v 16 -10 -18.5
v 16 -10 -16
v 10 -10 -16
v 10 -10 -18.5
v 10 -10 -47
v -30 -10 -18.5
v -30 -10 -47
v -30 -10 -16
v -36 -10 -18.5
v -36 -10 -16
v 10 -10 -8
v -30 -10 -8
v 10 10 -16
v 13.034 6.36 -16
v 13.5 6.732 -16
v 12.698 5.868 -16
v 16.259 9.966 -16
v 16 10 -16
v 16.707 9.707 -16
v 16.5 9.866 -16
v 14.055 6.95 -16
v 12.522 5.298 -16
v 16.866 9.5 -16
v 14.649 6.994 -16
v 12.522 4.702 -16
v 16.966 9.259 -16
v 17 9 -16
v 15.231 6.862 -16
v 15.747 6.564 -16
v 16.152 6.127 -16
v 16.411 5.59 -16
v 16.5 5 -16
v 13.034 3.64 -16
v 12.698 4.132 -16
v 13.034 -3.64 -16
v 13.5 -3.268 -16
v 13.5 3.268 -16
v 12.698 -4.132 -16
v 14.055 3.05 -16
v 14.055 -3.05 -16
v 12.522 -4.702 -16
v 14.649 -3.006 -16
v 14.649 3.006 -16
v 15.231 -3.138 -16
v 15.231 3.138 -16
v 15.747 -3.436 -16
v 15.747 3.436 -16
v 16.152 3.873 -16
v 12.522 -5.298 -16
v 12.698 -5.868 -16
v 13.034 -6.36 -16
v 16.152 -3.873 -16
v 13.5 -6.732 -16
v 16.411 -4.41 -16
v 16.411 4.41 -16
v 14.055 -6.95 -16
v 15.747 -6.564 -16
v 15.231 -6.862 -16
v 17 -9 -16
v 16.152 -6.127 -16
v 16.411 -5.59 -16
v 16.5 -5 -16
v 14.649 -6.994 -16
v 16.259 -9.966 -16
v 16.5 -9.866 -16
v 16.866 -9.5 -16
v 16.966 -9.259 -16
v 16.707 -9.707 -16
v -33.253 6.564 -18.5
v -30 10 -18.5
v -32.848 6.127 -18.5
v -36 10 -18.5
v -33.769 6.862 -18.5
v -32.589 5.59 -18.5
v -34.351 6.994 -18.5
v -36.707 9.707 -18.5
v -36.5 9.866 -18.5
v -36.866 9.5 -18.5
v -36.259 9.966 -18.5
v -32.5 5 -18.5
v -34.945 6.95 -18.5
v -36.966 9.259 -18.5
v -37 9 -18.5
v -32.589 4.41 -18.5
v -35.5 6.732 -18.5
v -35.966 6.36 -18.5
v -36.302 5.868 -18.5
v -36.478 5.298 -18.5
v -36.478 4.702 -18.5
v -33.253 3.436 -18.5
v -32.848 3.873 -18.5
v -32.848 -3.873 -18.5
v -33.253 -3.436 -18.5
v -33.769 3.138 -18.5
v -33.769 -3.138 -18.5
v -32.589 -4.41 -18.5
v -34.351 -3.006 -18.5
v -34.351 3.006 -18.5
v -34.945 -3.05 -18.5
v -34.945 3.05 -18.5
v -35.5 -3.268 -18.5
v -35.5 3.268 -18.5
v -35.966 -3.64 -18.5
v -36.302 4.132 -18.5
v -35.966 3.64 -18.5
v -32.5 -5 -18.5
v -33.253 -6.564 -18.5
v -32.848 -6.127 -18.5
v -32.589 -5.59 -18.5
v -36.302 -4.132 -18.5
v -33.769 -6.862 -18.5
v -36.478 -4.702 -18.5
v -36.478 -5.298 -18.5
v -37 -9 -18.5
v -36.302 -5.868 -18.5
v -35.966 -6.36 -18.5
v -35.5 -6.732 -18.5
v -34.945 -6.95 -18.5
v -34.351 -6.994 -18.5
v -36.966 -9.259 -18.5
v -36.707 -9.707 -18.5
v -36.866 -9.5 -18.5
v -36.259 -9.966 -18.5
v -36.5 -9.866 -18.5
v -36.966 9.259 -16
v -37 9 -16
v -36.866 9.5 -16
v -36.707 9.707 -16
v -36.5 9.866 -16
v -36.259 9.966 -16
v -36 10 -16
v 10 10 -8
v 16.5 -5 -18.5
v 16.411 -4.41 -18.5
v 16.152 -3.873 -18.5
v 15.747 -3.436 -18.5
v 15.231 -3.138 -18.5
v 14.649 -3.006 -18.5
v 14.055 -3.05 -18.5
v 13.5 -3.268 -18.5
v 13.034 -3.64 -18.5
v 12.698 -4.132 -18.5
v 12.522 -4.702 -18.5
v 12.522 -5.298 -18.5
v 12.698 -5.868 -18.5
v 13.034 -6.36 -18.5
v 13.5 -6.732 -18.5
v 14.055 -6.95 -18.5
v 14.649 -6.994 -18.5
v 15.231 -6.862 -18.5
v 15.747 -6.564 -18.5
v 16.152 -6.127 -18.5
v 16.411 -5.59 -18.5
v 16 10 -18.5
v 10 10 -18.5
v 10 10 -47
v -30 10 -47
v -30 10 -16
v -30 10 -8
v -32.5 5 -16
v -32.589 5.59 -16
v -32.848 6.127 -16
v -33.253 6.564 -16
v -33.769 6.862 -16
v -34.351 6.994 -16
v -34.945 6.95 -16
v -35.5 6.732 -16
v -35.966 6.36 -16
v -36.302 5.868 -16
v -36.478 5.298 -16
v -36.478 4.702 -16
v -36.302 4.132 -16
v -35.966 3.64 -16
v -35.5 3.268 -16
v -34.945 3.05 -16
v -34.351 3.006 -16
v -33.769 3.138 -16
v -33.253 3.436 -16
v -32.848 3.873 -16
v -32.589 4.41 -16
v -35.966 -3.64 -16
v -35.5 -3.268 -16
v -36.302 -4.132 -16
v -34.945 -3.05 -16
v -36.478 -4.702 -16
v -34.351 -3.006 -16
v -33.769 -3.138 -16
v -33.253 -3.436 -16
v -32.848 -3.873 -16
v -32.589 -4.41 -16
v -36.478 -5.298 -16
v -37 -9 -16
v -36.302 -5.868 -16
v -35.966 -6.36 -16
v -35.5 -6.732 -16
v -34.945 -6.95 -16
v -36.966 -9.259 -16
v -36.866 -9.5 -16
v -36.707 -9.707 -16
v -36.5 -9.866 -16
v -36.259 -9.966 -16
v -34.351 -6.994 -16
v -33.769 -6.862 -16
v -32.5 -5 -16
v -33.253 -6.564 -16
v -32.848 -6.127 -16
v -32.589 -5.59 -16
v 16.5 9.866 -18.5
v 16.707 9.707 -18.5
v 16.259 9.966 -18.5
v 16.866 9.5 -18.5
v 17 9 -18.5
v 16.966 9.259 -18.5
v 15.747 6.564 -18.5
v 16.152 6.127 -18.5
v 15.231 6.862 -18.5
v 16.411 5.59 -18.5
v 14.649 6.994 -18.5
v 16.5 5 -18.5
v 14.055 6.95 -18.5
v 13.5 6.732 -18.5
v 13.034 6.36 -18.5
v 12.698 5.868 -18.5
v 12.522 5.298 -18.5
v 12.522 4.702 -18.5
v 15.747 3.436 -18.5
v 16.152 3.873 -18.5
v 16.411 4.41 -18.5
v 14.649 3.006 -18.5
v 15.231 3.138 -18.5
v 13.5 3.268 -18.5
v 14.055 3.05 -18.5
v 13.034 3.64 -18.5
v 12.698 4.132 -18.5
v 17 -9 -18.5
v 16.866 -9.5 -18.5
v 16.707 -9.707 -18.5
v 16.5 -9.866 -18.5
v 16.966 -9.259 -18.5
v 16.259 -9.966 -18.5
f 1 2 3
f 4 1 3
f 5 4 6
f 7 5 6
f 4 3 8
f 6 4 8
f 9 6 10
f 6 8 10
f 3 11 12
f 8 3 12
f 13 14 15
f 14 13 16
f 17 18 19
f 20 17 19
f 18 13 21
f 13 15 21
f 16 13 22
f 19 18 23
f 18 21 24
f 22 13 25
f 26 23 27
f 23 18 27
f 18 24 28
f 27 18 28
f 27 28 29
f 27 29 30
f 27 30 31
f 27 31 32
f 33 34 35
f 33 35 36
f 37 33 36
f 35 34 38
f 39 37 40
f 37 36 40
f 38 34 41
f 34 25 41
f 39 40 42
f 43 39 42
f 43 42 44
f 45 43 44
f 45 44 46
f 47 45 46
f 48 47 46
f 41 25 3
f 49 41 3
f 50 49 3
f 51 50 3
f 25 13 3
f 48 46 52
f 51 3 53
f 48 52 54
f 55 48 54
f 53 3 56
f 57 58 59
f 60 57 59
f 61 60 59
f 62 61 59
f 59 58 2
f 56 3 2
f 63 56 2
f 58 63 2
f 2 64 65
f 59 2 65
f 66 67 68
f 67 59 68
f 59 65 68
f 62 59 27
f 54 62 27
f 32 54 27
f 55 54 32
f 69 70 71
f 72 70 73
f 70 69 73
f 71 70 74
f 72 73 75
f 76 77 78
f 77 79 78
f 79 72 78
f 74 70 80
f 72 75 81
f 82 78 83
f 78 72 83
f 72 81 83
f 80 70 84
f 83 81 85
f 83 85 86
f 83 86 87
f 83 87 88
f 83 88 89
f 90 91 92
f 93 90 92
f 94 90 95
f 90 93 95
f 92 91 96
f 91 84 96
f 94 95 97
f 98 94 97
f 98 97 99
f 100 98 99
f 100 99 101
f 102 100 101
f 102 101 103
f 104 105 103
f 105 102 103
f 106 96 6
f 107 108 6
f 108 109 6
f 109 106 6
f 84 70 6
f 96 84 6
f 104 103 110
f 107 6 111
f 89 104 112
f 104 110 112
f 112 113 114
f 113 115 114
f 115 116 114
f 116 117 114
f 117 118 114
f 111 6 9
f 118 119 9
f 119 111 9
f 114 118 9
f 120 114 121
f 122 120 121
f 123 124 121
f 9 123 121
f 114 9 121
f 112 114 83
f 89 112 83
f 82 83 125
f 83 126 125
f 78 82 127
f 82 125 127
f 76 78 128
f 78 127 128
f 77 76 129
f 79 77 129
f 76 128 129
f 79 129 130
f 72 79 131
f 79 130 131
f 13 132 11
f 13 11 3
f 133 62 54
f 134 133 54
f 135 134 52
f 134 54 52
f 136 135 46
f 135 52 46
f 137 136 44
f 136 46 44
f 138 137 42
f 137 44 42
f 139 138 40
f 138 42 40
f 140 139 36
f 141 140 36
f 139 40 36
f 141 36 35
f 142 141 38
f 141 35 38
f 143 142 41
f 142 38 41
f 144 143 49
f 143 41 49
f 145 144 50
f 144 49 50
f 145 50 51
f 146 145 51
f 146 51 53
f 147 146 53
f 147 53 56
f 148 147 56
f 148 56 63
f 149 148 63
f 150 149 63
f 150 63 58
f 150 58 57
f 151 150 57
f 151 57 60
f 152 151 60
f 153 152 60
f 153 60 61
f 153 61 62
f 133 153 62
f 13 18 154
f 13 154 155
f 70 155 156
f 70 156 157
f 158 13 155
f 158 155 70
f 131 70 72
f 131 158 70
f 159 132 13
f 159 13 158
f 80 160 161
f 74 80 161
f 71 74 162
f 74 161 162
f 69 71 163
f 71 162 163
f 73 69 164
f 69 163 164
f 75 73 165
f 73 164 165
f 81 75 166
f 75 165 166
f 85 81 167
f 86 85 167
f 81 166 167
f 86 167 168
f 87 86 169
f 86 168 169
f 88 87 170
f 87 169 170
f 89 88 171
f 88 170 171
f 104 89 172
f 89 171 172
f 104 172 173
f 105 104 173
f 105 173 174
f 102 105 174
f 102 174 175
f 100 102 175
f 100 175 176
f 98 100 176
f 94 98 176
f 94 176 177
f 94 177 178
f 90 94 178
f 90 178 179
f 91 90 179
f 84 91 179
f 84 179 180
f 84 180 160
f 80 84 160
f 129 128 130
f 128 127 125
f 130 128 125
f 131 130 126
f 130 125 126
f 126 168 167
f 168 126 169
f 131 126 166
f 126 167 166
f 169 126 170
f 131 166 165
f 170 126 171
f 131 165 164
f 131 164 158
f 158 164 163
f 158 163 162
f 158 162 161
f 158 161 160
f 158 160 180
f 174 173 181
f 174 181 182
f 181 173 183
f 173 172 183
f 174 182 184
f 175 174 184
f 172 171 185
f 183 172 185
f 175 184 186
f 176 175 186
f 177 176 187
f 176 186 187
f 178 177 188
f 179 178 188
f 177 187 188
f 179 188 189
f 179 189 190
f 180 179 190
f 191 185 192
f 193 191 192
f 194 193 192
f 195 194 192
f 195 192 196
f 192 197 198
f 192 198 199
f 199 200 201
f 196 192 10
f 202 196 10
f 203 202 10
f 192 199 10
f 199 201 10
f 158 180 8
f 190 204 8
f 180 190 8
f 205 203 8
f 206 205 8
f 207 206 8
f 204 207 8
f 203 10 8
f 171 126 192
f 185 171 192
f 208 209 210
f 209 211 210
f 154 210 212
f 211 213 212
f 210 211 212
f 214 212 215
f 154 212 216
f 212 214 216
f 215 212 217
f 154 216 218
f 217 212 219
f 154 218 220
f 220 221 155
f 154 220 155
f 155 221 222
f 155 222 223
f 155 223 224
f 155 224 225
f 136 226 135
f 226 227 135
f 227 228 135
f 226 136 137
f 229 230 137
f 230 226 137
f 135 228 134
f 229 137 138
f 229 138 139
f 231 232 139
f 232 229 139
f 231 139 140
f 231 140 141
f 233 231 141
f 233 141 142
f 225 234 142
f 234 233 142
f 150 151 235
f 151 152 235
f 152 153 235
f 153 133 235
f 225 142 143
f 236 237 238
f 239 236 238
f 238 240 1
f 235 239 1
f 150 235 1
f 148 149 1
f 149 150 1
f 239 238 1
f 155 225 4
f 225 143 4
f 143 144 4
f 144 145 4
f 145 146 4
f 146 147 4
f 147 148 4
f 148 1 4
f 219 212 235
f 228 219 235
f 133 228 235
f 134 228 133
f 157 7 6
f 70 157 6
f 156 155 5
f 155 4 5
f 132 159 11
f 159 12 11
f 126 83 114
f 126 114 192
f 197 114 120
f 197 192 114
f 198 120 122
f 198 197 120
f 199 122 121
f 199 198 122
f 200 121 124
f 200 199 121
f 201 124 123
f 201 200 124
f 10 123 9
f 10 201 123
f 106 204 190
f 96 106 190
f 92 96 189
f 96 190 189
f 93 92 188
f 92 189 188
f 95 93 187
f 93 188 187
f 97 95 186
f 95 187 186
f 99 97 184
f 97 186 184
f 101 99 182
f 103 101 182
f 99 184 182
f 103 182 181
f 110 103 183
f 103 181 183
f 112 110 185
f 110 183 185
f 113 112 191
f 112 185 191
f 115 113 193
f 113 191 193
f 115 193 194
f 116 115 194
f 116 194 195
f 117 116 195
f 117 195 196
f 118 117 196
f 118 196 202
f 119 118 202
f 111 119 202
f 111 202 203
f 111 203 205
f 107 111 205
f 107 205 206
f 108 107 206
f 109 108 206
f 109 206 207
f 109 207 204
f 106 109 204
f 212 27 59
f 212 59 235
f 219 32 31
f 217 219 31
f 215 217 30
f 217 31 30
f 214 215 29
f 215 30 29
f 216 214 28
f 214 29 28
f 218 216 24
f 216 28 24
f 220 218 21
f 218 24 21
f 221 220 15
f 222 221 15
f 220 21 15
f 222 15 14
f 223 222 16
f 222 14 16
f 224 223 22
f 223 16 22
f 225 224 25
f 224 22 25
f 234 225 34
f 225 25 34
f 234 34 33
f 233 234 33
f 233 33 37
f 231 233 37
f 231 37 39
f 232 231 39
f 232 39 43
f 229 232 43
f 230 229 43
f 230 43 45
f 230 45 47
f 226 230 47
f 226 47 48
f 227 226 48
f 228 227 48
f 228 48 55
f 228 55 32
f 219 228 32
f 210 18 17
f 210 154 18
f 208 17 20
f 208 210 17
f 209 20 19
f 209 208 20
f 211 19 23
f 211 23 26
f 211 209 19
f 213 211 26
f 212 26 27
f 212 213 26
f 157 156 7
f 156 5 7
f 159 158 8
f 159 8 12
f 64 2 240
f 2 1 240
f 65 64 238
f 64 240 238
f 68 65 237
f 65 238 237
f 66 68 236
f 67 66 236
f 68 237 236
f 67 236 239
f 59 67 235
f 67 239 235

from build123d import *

# Parameters (mm, degrees)
PAD050_DEPTH    = 10
SKETCH087_R     = 2
POCKET033_DEPTH = 47.001
FILLET024_R     = 1


with BuildPart() as part:
    # Sketch086 → Pad050 (new body, symmetric)
    with BuildSketch(Plane.XZ):
        Polygon((-37, -18.5), (-37, -16), (-30, -16), (-30, -8), (10, -8), (10, -16), (17, -16), (17, -18.5), (10, -18.5), (10, -47), (-30, -47), (-30, -18.5), align=None)
    extrude(amount=PAD050_DEPTH, both=True)

    # Sketch087 → Pocket033 (cut, through all)
    with BuildSketch(Plane.XY):
        with Locations((14.5, 5)):
            Circle(SKETCH087_R)
        with Locations((14.5, -5)):
            Circle(SKETCH087_R)
        with Locations((-34.5, 5)):
            Circle(SKETCH087_R)
        with Locations((-34.5, -5)):
            Circle(SKETCH087_R)
    extrude(amount=-POCKET033_DEPTH, mode=Mode.SUBTRACT)

    # Fillet024
    fillet024_edges = [part.edges().sort_by_distance(p)[0] for p in [
        (17, -10, -17.25),
        (17, 10, -17.25),
        (-37, -10, -17.25),
        (-37, 10, -17.25),
    ]]
    fillet(fillet024_edges, radius=FILLET024_R)


solid = part.part
